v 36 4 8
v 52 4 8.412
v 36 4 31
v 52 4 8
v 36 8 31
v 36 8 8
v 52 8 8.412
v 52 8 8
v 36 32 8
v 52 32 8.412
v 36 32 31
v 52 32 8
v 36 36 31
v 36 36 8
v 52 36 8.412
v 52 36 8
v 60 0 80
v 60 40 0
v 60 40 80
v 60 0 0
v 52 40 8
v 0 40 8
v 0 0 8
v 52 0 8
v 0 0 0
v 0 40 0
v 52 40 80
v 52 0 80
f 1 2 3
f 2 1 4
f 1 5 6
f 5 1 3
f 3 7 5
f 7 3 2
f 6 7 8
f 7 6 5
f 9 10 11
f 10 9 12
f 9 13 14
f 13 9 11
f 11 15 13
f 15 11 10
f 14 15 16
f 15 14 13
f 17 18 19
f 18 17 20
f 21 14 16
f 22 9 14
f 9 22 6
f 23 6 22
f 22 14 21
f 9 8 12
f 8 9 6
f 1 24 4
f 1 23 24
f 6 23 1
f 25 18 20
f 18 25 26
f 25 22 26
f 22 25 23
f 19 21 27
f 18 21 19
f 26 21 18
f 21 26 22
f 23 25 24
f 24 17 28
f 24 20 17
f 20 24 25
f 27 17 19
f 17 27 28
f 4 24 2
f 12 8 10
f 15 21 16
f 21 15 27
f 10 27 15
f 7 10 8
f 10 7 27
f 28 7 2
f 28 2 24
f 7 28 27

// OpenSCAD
$fn = 32;

// ----------------------------------------------------------------------
// Rib bracket: 2-gusset L bracket
// ----------------------------------------------------------------------

// --- parameters (mm) ---
base_l = 60;              // foot length, X
base_w = 40;              // foot width, Y
base_t = 8;               // foot thickness
plate_t = 8;              // upright plate thickness
plate_h = 80;             // overall height
gus_l = 16;               // gusset leg along the foot
gus_h = 24;               // gusset height
gus_t = 4;                // gusset thickness
gus_edge = 4;             // gusset margin from the foot edge
n_gus = 2;                // gusset count

gus_pitch = (base_w - 2 * gus_edge - gus_t) / (n_gus - 1);  // gusset pitch

union() {
  cube([base_l, base_w, base_t]);
  translate([base_l - plate_t, 0, base_t - 1])
    cube([plate_t, base_w, plate_h - base_t + 1]);
  for (i = [0 : n_gus - 1])
    translate([base_l - plate_t - gus_l, gus_edge + i * gus_pitch, base_t - 1])
      rotate([-90, 0, 0])
        linear_extrude(height = gus_t)
          polygon(points = [[0, 0], [gus_l + 1, 0], [0, -gus_h]]);
}
